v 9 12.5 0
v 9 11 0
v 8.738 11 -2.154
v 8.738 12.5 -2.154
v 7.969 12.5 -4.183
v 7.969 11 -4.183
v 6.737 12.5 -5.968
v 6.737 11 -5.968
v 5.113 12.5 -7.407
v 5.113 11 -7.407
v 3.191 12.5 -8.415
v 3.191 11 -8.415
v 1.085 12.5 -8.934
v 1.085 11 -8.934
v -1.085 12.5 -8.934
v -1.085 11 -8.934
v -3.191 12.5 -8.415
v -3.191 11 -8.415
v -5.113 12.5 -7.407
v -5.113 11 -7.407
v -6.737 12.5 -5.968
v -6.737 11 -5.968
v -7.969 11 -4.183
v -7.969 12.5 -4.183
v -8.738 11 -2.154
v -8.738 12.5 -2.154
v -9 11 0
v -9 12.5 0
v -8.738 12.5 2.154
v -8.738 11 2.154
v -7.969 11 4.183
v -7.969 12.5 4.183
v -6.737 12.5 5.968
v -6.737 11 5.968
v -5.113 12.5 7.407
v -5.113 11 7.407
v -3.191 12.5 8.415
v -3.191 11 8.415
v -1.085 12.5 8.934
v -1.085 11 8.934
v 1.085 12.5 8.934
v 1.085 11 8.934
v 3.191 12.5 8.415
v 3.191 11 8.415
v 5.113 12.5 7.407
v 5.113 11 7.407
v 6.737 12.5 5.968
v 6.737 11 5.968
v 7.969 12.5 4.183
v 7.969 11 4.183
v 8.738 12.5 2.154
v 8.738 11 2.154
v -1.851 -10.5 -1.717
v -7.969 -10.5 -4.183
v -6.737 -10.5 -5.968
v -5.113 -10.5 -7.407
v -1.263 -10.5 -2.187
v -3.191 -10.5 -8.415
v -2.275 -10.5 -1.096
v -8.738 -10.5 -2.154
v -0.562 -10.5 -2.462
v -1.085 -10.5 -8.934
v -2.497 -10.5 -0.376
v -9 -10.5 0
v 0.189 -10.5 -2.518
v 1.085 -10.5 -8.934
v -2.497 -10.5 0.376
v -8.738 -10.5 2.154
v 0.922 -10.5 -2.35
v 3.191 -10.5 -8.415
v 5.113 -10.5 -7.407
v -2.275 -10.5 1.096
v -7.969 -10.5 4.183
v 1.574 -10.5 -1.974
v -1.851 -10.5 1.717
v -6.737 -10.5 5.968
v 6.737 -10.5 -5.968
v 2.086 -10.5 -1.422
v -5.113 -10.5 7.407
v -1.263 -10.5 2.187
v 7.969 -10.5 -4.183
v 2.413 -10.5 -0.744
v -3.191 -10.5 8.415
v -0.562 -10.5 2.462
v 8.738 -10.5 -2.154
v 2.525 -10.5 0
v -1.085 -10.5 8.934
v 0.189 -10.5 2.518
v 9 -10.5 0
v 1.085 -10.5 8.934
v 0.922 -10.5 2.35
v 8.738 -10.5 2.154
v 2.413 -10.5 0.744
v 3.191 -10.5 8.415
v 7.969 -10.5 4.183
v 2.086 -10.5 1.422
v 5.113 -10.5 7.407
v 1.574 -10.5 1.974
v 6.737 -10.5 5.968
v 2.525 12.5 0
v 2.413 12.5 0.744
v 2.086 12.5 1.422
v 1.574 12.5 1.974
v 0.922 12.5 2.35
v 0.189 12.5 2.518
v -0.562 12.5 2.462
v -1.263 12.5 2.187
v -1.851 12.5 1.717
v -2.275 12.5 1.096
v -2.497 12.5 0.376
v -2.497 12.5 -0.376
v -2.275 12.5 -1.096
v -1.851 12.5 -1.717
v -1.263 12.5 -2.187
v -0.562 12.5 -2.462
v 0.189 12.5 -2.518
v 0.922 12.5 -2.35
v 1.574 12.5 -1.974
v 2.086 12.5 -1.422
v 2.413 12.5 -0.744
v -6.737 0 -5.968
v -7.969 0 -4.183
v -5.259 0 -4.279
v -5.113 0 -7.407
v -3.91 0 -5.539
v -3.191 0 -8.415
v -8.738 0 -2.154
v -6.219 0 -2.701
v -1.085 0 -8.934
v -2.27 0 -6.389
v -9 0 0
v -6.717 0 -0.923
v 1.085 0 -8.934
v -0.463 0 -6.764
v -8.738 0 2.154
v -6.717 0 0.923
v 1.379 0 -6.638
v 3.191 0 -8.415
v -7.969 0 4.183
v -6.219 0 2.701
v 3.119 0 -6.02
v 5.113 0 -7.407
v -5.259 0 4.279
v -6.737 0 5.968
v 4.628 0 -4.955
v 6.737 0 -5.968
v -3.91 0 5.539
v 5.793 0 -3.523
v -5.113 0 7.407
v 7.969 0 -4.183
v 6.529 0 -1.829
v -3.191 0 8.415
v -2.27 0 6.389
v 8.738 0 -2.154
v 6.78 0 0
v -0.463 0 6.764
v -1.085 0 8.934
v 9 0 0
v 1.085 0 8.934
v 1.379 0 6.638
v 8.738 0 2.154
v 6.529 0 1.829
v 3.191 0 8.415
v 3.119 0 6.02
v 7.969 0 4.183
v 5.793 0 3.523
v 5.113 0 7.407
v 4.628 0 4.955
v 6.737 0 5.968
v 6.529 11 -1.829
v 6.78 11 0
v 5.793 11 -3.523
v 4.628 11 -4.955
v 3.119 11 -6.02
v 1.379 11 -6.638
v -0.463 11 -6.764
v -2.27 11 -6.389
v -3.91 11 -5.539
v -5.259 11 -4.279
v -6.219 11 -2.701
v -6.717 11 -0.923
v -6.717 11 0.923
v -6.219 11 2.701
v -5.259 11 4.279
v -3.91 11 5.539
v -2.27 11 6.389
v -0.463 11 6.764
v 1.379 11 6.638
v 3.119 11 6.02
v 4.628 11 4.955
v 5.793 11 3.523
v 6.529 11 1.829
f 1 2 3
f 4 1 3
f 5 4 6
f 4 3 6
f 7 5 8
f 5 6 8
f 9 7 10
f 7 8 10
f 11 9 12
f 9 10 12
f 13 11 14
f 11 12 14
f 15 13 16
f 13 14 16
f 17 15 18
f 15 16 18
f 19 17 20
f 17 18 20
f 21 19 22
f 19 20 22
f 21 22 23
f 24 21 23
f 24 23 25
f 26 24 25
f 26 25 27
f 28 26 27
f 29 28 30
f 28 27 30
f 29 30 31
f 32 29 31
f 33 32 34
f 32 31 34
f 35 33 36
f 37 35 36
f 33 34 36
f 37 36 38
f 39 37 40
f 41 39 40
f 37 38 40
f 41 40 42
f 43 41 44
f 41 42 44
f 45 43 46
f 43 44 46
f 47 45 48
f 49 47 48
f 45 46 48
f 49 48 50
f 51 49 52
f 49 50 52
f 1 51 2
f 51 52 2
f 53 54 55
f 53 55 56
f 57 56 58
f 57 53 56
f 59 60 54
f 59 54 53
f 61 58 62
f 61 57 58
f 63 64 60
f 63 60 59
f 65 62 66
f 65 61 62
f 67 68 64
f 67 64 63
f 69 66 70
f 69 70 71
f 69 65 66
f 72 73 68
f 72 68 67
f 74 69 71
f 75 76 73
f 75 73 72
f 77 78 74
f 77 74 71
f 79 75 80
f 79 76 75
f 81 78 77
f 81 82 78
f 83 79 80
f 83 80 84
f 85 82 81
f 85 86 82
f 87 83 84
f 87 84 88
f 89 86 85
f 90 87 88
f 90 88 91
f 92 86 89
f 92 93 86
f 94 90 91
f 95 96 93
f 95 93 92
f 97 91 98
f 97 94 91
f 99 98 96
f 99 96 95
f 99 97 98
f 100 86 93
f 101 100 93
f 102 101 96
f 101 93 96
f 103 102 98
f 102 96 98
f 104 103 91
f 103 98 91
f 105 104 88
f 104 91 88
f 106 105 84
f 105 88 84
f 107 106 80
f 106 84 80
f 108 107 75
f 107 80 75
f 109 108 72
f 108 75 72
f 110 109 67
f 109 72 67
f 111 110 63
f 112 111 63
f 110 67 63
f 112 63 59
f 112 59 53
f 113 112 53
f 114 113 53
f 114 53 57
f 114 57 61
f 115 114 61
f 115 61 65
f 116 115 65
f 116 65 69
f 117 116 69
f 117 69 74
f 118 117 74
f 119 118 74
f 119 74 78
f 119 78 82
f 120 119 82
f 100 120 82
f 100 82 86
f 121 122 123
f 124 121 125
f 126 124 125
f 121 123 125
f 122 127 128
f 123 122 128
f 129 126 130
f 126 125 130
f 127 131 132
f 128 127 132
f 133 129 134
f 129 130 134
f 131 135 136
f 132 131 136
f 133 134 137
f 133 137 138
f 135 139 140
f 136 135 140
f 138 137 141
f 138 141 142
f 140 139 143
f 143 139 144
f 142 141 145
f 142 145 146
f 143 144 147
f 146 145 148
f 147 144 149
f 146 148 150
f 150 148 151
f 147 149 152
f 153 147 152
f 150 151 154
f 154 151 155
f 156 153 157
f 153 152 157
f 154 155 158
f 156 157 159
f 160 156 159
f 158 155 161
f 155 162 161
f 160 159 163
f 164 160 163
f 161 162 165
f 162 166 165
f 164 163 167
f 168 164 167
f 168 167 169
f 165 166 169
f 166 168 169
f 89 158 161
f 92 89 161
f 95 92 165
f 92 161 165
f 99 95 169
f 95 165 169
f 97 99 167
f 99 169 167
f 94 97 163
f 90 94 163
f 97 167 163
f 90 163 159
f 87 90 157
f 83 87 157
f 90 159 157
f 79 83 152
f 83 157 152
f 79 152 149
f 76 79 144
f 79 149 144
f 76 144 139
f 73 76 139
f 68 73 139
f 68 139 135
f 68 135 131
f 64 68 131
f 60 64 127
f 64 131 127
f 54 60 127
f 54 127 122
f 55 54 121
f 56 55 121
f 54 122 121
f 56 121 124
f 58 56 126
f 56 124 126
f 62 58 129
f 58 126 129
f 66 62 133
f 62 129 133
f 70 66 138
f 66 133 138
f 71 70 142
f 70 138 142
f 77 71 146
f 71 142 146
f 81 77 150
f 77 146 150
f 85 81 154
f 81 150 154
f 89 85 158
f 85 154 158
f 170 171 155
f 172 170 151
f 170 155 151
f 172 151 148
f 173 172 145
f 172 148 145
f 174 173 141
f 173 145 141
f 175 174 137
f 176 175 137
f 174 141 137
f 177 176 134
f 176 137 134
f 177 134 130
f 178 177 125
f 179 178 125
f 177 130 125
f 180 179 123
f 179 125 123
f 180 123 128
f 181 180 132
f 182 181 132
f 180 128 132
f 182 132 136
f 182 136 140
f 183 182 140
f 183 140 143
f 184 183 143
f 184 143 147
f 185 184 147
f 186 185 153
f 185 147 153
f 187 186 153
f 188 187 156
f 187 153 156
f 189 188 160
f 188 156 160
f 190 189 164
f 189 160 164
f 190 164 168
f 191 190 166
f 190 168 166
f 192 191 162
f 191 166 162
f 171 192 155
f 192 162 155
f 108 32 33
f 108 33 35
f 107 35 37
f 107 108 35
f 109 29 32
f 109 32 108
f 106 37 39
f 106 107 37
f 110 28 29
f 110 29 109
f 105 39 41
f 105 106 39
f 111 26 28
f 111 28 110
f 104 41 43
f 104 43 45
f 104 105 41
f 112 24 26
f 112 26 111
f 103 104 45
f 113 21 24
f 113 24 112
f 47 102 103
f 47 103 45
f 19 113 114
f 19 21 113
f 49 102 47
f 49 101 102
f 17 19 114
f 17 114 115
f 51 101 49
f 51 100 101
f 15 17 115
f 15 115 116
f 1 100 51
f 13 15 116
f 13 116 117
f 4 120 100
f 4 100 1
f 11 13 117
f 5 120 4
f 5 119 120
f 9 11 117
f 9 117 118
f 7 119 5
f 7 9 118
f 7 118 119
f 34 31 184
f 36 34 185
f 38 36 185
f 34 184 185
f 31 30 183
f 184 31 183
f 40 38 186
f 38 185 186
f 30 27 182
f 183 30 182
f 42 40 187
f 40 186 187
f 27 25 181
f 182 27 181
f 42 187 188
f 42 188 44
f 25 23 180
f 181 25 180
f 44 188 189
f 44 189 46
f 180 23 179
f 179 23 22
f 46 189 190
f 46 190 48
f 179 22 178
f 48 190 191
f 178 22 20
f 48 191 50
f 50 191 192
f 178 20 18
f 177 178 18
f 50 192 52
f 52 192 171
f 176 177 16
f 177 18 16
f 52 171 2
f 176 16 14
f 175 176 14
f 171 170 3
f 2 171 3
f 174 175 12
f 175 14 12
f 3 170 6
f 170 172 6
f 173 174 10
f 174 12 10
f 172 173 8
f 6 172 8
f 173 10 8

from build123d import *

# Parameters (mm, degrees)
SKETCH_1_R            = 6.78
EXTRUDE_2_DEPTH       = 11
SKETCH_3_R            = 9
EXTRUDE_355_DEPTH     = 1.5
SKETCH_4_R            = 9
EXTRUDE_447_DEPTH     = 10.5
SKETCH_5_R            = 2.525
CUT_EXTRUDE_536_DEPTH = 24


with BuildPart() as part:
    # 草图1 → 凸台-拉伸2 (new body)
    with BuildSketch(Plane(origin=(0, 0, 0), x_dir=(1, 0, 0), z_dir=(0, 1, 0))):
        Circle(SKETCH_1_R)
    extrude(amount=EXTRUDE_2_DEPTH)

    # 草图3 → Extrude 355 (add)
    with BuildSketch(Plane(origin=(0, 11, 0), x_dir=(1, 0, 0), z_dir=(0, 1, 0))):
        Circle(SKETCH_3_R)
    extrude(amount=EXTRUDE_355_DEPTH)

    # 草图4 → Extrude 447 (add)
    with BuildSketch(Plane.XZ):
        Circle(SKETCH_4_R)
    extrude(amount=EXTRUDE_447_DEPTH)

    # 草图5 → Cut-Extrude 536 (cut, through all)
    with BuildSketch(Plane.XZ.offset(10.5)):
        Circle(SKETCH_5_R)
    extrude(amount=-CUT_EXTRUDE_536_DEPTH, mode=Mode.SUBTRACT)


solid = part.part
